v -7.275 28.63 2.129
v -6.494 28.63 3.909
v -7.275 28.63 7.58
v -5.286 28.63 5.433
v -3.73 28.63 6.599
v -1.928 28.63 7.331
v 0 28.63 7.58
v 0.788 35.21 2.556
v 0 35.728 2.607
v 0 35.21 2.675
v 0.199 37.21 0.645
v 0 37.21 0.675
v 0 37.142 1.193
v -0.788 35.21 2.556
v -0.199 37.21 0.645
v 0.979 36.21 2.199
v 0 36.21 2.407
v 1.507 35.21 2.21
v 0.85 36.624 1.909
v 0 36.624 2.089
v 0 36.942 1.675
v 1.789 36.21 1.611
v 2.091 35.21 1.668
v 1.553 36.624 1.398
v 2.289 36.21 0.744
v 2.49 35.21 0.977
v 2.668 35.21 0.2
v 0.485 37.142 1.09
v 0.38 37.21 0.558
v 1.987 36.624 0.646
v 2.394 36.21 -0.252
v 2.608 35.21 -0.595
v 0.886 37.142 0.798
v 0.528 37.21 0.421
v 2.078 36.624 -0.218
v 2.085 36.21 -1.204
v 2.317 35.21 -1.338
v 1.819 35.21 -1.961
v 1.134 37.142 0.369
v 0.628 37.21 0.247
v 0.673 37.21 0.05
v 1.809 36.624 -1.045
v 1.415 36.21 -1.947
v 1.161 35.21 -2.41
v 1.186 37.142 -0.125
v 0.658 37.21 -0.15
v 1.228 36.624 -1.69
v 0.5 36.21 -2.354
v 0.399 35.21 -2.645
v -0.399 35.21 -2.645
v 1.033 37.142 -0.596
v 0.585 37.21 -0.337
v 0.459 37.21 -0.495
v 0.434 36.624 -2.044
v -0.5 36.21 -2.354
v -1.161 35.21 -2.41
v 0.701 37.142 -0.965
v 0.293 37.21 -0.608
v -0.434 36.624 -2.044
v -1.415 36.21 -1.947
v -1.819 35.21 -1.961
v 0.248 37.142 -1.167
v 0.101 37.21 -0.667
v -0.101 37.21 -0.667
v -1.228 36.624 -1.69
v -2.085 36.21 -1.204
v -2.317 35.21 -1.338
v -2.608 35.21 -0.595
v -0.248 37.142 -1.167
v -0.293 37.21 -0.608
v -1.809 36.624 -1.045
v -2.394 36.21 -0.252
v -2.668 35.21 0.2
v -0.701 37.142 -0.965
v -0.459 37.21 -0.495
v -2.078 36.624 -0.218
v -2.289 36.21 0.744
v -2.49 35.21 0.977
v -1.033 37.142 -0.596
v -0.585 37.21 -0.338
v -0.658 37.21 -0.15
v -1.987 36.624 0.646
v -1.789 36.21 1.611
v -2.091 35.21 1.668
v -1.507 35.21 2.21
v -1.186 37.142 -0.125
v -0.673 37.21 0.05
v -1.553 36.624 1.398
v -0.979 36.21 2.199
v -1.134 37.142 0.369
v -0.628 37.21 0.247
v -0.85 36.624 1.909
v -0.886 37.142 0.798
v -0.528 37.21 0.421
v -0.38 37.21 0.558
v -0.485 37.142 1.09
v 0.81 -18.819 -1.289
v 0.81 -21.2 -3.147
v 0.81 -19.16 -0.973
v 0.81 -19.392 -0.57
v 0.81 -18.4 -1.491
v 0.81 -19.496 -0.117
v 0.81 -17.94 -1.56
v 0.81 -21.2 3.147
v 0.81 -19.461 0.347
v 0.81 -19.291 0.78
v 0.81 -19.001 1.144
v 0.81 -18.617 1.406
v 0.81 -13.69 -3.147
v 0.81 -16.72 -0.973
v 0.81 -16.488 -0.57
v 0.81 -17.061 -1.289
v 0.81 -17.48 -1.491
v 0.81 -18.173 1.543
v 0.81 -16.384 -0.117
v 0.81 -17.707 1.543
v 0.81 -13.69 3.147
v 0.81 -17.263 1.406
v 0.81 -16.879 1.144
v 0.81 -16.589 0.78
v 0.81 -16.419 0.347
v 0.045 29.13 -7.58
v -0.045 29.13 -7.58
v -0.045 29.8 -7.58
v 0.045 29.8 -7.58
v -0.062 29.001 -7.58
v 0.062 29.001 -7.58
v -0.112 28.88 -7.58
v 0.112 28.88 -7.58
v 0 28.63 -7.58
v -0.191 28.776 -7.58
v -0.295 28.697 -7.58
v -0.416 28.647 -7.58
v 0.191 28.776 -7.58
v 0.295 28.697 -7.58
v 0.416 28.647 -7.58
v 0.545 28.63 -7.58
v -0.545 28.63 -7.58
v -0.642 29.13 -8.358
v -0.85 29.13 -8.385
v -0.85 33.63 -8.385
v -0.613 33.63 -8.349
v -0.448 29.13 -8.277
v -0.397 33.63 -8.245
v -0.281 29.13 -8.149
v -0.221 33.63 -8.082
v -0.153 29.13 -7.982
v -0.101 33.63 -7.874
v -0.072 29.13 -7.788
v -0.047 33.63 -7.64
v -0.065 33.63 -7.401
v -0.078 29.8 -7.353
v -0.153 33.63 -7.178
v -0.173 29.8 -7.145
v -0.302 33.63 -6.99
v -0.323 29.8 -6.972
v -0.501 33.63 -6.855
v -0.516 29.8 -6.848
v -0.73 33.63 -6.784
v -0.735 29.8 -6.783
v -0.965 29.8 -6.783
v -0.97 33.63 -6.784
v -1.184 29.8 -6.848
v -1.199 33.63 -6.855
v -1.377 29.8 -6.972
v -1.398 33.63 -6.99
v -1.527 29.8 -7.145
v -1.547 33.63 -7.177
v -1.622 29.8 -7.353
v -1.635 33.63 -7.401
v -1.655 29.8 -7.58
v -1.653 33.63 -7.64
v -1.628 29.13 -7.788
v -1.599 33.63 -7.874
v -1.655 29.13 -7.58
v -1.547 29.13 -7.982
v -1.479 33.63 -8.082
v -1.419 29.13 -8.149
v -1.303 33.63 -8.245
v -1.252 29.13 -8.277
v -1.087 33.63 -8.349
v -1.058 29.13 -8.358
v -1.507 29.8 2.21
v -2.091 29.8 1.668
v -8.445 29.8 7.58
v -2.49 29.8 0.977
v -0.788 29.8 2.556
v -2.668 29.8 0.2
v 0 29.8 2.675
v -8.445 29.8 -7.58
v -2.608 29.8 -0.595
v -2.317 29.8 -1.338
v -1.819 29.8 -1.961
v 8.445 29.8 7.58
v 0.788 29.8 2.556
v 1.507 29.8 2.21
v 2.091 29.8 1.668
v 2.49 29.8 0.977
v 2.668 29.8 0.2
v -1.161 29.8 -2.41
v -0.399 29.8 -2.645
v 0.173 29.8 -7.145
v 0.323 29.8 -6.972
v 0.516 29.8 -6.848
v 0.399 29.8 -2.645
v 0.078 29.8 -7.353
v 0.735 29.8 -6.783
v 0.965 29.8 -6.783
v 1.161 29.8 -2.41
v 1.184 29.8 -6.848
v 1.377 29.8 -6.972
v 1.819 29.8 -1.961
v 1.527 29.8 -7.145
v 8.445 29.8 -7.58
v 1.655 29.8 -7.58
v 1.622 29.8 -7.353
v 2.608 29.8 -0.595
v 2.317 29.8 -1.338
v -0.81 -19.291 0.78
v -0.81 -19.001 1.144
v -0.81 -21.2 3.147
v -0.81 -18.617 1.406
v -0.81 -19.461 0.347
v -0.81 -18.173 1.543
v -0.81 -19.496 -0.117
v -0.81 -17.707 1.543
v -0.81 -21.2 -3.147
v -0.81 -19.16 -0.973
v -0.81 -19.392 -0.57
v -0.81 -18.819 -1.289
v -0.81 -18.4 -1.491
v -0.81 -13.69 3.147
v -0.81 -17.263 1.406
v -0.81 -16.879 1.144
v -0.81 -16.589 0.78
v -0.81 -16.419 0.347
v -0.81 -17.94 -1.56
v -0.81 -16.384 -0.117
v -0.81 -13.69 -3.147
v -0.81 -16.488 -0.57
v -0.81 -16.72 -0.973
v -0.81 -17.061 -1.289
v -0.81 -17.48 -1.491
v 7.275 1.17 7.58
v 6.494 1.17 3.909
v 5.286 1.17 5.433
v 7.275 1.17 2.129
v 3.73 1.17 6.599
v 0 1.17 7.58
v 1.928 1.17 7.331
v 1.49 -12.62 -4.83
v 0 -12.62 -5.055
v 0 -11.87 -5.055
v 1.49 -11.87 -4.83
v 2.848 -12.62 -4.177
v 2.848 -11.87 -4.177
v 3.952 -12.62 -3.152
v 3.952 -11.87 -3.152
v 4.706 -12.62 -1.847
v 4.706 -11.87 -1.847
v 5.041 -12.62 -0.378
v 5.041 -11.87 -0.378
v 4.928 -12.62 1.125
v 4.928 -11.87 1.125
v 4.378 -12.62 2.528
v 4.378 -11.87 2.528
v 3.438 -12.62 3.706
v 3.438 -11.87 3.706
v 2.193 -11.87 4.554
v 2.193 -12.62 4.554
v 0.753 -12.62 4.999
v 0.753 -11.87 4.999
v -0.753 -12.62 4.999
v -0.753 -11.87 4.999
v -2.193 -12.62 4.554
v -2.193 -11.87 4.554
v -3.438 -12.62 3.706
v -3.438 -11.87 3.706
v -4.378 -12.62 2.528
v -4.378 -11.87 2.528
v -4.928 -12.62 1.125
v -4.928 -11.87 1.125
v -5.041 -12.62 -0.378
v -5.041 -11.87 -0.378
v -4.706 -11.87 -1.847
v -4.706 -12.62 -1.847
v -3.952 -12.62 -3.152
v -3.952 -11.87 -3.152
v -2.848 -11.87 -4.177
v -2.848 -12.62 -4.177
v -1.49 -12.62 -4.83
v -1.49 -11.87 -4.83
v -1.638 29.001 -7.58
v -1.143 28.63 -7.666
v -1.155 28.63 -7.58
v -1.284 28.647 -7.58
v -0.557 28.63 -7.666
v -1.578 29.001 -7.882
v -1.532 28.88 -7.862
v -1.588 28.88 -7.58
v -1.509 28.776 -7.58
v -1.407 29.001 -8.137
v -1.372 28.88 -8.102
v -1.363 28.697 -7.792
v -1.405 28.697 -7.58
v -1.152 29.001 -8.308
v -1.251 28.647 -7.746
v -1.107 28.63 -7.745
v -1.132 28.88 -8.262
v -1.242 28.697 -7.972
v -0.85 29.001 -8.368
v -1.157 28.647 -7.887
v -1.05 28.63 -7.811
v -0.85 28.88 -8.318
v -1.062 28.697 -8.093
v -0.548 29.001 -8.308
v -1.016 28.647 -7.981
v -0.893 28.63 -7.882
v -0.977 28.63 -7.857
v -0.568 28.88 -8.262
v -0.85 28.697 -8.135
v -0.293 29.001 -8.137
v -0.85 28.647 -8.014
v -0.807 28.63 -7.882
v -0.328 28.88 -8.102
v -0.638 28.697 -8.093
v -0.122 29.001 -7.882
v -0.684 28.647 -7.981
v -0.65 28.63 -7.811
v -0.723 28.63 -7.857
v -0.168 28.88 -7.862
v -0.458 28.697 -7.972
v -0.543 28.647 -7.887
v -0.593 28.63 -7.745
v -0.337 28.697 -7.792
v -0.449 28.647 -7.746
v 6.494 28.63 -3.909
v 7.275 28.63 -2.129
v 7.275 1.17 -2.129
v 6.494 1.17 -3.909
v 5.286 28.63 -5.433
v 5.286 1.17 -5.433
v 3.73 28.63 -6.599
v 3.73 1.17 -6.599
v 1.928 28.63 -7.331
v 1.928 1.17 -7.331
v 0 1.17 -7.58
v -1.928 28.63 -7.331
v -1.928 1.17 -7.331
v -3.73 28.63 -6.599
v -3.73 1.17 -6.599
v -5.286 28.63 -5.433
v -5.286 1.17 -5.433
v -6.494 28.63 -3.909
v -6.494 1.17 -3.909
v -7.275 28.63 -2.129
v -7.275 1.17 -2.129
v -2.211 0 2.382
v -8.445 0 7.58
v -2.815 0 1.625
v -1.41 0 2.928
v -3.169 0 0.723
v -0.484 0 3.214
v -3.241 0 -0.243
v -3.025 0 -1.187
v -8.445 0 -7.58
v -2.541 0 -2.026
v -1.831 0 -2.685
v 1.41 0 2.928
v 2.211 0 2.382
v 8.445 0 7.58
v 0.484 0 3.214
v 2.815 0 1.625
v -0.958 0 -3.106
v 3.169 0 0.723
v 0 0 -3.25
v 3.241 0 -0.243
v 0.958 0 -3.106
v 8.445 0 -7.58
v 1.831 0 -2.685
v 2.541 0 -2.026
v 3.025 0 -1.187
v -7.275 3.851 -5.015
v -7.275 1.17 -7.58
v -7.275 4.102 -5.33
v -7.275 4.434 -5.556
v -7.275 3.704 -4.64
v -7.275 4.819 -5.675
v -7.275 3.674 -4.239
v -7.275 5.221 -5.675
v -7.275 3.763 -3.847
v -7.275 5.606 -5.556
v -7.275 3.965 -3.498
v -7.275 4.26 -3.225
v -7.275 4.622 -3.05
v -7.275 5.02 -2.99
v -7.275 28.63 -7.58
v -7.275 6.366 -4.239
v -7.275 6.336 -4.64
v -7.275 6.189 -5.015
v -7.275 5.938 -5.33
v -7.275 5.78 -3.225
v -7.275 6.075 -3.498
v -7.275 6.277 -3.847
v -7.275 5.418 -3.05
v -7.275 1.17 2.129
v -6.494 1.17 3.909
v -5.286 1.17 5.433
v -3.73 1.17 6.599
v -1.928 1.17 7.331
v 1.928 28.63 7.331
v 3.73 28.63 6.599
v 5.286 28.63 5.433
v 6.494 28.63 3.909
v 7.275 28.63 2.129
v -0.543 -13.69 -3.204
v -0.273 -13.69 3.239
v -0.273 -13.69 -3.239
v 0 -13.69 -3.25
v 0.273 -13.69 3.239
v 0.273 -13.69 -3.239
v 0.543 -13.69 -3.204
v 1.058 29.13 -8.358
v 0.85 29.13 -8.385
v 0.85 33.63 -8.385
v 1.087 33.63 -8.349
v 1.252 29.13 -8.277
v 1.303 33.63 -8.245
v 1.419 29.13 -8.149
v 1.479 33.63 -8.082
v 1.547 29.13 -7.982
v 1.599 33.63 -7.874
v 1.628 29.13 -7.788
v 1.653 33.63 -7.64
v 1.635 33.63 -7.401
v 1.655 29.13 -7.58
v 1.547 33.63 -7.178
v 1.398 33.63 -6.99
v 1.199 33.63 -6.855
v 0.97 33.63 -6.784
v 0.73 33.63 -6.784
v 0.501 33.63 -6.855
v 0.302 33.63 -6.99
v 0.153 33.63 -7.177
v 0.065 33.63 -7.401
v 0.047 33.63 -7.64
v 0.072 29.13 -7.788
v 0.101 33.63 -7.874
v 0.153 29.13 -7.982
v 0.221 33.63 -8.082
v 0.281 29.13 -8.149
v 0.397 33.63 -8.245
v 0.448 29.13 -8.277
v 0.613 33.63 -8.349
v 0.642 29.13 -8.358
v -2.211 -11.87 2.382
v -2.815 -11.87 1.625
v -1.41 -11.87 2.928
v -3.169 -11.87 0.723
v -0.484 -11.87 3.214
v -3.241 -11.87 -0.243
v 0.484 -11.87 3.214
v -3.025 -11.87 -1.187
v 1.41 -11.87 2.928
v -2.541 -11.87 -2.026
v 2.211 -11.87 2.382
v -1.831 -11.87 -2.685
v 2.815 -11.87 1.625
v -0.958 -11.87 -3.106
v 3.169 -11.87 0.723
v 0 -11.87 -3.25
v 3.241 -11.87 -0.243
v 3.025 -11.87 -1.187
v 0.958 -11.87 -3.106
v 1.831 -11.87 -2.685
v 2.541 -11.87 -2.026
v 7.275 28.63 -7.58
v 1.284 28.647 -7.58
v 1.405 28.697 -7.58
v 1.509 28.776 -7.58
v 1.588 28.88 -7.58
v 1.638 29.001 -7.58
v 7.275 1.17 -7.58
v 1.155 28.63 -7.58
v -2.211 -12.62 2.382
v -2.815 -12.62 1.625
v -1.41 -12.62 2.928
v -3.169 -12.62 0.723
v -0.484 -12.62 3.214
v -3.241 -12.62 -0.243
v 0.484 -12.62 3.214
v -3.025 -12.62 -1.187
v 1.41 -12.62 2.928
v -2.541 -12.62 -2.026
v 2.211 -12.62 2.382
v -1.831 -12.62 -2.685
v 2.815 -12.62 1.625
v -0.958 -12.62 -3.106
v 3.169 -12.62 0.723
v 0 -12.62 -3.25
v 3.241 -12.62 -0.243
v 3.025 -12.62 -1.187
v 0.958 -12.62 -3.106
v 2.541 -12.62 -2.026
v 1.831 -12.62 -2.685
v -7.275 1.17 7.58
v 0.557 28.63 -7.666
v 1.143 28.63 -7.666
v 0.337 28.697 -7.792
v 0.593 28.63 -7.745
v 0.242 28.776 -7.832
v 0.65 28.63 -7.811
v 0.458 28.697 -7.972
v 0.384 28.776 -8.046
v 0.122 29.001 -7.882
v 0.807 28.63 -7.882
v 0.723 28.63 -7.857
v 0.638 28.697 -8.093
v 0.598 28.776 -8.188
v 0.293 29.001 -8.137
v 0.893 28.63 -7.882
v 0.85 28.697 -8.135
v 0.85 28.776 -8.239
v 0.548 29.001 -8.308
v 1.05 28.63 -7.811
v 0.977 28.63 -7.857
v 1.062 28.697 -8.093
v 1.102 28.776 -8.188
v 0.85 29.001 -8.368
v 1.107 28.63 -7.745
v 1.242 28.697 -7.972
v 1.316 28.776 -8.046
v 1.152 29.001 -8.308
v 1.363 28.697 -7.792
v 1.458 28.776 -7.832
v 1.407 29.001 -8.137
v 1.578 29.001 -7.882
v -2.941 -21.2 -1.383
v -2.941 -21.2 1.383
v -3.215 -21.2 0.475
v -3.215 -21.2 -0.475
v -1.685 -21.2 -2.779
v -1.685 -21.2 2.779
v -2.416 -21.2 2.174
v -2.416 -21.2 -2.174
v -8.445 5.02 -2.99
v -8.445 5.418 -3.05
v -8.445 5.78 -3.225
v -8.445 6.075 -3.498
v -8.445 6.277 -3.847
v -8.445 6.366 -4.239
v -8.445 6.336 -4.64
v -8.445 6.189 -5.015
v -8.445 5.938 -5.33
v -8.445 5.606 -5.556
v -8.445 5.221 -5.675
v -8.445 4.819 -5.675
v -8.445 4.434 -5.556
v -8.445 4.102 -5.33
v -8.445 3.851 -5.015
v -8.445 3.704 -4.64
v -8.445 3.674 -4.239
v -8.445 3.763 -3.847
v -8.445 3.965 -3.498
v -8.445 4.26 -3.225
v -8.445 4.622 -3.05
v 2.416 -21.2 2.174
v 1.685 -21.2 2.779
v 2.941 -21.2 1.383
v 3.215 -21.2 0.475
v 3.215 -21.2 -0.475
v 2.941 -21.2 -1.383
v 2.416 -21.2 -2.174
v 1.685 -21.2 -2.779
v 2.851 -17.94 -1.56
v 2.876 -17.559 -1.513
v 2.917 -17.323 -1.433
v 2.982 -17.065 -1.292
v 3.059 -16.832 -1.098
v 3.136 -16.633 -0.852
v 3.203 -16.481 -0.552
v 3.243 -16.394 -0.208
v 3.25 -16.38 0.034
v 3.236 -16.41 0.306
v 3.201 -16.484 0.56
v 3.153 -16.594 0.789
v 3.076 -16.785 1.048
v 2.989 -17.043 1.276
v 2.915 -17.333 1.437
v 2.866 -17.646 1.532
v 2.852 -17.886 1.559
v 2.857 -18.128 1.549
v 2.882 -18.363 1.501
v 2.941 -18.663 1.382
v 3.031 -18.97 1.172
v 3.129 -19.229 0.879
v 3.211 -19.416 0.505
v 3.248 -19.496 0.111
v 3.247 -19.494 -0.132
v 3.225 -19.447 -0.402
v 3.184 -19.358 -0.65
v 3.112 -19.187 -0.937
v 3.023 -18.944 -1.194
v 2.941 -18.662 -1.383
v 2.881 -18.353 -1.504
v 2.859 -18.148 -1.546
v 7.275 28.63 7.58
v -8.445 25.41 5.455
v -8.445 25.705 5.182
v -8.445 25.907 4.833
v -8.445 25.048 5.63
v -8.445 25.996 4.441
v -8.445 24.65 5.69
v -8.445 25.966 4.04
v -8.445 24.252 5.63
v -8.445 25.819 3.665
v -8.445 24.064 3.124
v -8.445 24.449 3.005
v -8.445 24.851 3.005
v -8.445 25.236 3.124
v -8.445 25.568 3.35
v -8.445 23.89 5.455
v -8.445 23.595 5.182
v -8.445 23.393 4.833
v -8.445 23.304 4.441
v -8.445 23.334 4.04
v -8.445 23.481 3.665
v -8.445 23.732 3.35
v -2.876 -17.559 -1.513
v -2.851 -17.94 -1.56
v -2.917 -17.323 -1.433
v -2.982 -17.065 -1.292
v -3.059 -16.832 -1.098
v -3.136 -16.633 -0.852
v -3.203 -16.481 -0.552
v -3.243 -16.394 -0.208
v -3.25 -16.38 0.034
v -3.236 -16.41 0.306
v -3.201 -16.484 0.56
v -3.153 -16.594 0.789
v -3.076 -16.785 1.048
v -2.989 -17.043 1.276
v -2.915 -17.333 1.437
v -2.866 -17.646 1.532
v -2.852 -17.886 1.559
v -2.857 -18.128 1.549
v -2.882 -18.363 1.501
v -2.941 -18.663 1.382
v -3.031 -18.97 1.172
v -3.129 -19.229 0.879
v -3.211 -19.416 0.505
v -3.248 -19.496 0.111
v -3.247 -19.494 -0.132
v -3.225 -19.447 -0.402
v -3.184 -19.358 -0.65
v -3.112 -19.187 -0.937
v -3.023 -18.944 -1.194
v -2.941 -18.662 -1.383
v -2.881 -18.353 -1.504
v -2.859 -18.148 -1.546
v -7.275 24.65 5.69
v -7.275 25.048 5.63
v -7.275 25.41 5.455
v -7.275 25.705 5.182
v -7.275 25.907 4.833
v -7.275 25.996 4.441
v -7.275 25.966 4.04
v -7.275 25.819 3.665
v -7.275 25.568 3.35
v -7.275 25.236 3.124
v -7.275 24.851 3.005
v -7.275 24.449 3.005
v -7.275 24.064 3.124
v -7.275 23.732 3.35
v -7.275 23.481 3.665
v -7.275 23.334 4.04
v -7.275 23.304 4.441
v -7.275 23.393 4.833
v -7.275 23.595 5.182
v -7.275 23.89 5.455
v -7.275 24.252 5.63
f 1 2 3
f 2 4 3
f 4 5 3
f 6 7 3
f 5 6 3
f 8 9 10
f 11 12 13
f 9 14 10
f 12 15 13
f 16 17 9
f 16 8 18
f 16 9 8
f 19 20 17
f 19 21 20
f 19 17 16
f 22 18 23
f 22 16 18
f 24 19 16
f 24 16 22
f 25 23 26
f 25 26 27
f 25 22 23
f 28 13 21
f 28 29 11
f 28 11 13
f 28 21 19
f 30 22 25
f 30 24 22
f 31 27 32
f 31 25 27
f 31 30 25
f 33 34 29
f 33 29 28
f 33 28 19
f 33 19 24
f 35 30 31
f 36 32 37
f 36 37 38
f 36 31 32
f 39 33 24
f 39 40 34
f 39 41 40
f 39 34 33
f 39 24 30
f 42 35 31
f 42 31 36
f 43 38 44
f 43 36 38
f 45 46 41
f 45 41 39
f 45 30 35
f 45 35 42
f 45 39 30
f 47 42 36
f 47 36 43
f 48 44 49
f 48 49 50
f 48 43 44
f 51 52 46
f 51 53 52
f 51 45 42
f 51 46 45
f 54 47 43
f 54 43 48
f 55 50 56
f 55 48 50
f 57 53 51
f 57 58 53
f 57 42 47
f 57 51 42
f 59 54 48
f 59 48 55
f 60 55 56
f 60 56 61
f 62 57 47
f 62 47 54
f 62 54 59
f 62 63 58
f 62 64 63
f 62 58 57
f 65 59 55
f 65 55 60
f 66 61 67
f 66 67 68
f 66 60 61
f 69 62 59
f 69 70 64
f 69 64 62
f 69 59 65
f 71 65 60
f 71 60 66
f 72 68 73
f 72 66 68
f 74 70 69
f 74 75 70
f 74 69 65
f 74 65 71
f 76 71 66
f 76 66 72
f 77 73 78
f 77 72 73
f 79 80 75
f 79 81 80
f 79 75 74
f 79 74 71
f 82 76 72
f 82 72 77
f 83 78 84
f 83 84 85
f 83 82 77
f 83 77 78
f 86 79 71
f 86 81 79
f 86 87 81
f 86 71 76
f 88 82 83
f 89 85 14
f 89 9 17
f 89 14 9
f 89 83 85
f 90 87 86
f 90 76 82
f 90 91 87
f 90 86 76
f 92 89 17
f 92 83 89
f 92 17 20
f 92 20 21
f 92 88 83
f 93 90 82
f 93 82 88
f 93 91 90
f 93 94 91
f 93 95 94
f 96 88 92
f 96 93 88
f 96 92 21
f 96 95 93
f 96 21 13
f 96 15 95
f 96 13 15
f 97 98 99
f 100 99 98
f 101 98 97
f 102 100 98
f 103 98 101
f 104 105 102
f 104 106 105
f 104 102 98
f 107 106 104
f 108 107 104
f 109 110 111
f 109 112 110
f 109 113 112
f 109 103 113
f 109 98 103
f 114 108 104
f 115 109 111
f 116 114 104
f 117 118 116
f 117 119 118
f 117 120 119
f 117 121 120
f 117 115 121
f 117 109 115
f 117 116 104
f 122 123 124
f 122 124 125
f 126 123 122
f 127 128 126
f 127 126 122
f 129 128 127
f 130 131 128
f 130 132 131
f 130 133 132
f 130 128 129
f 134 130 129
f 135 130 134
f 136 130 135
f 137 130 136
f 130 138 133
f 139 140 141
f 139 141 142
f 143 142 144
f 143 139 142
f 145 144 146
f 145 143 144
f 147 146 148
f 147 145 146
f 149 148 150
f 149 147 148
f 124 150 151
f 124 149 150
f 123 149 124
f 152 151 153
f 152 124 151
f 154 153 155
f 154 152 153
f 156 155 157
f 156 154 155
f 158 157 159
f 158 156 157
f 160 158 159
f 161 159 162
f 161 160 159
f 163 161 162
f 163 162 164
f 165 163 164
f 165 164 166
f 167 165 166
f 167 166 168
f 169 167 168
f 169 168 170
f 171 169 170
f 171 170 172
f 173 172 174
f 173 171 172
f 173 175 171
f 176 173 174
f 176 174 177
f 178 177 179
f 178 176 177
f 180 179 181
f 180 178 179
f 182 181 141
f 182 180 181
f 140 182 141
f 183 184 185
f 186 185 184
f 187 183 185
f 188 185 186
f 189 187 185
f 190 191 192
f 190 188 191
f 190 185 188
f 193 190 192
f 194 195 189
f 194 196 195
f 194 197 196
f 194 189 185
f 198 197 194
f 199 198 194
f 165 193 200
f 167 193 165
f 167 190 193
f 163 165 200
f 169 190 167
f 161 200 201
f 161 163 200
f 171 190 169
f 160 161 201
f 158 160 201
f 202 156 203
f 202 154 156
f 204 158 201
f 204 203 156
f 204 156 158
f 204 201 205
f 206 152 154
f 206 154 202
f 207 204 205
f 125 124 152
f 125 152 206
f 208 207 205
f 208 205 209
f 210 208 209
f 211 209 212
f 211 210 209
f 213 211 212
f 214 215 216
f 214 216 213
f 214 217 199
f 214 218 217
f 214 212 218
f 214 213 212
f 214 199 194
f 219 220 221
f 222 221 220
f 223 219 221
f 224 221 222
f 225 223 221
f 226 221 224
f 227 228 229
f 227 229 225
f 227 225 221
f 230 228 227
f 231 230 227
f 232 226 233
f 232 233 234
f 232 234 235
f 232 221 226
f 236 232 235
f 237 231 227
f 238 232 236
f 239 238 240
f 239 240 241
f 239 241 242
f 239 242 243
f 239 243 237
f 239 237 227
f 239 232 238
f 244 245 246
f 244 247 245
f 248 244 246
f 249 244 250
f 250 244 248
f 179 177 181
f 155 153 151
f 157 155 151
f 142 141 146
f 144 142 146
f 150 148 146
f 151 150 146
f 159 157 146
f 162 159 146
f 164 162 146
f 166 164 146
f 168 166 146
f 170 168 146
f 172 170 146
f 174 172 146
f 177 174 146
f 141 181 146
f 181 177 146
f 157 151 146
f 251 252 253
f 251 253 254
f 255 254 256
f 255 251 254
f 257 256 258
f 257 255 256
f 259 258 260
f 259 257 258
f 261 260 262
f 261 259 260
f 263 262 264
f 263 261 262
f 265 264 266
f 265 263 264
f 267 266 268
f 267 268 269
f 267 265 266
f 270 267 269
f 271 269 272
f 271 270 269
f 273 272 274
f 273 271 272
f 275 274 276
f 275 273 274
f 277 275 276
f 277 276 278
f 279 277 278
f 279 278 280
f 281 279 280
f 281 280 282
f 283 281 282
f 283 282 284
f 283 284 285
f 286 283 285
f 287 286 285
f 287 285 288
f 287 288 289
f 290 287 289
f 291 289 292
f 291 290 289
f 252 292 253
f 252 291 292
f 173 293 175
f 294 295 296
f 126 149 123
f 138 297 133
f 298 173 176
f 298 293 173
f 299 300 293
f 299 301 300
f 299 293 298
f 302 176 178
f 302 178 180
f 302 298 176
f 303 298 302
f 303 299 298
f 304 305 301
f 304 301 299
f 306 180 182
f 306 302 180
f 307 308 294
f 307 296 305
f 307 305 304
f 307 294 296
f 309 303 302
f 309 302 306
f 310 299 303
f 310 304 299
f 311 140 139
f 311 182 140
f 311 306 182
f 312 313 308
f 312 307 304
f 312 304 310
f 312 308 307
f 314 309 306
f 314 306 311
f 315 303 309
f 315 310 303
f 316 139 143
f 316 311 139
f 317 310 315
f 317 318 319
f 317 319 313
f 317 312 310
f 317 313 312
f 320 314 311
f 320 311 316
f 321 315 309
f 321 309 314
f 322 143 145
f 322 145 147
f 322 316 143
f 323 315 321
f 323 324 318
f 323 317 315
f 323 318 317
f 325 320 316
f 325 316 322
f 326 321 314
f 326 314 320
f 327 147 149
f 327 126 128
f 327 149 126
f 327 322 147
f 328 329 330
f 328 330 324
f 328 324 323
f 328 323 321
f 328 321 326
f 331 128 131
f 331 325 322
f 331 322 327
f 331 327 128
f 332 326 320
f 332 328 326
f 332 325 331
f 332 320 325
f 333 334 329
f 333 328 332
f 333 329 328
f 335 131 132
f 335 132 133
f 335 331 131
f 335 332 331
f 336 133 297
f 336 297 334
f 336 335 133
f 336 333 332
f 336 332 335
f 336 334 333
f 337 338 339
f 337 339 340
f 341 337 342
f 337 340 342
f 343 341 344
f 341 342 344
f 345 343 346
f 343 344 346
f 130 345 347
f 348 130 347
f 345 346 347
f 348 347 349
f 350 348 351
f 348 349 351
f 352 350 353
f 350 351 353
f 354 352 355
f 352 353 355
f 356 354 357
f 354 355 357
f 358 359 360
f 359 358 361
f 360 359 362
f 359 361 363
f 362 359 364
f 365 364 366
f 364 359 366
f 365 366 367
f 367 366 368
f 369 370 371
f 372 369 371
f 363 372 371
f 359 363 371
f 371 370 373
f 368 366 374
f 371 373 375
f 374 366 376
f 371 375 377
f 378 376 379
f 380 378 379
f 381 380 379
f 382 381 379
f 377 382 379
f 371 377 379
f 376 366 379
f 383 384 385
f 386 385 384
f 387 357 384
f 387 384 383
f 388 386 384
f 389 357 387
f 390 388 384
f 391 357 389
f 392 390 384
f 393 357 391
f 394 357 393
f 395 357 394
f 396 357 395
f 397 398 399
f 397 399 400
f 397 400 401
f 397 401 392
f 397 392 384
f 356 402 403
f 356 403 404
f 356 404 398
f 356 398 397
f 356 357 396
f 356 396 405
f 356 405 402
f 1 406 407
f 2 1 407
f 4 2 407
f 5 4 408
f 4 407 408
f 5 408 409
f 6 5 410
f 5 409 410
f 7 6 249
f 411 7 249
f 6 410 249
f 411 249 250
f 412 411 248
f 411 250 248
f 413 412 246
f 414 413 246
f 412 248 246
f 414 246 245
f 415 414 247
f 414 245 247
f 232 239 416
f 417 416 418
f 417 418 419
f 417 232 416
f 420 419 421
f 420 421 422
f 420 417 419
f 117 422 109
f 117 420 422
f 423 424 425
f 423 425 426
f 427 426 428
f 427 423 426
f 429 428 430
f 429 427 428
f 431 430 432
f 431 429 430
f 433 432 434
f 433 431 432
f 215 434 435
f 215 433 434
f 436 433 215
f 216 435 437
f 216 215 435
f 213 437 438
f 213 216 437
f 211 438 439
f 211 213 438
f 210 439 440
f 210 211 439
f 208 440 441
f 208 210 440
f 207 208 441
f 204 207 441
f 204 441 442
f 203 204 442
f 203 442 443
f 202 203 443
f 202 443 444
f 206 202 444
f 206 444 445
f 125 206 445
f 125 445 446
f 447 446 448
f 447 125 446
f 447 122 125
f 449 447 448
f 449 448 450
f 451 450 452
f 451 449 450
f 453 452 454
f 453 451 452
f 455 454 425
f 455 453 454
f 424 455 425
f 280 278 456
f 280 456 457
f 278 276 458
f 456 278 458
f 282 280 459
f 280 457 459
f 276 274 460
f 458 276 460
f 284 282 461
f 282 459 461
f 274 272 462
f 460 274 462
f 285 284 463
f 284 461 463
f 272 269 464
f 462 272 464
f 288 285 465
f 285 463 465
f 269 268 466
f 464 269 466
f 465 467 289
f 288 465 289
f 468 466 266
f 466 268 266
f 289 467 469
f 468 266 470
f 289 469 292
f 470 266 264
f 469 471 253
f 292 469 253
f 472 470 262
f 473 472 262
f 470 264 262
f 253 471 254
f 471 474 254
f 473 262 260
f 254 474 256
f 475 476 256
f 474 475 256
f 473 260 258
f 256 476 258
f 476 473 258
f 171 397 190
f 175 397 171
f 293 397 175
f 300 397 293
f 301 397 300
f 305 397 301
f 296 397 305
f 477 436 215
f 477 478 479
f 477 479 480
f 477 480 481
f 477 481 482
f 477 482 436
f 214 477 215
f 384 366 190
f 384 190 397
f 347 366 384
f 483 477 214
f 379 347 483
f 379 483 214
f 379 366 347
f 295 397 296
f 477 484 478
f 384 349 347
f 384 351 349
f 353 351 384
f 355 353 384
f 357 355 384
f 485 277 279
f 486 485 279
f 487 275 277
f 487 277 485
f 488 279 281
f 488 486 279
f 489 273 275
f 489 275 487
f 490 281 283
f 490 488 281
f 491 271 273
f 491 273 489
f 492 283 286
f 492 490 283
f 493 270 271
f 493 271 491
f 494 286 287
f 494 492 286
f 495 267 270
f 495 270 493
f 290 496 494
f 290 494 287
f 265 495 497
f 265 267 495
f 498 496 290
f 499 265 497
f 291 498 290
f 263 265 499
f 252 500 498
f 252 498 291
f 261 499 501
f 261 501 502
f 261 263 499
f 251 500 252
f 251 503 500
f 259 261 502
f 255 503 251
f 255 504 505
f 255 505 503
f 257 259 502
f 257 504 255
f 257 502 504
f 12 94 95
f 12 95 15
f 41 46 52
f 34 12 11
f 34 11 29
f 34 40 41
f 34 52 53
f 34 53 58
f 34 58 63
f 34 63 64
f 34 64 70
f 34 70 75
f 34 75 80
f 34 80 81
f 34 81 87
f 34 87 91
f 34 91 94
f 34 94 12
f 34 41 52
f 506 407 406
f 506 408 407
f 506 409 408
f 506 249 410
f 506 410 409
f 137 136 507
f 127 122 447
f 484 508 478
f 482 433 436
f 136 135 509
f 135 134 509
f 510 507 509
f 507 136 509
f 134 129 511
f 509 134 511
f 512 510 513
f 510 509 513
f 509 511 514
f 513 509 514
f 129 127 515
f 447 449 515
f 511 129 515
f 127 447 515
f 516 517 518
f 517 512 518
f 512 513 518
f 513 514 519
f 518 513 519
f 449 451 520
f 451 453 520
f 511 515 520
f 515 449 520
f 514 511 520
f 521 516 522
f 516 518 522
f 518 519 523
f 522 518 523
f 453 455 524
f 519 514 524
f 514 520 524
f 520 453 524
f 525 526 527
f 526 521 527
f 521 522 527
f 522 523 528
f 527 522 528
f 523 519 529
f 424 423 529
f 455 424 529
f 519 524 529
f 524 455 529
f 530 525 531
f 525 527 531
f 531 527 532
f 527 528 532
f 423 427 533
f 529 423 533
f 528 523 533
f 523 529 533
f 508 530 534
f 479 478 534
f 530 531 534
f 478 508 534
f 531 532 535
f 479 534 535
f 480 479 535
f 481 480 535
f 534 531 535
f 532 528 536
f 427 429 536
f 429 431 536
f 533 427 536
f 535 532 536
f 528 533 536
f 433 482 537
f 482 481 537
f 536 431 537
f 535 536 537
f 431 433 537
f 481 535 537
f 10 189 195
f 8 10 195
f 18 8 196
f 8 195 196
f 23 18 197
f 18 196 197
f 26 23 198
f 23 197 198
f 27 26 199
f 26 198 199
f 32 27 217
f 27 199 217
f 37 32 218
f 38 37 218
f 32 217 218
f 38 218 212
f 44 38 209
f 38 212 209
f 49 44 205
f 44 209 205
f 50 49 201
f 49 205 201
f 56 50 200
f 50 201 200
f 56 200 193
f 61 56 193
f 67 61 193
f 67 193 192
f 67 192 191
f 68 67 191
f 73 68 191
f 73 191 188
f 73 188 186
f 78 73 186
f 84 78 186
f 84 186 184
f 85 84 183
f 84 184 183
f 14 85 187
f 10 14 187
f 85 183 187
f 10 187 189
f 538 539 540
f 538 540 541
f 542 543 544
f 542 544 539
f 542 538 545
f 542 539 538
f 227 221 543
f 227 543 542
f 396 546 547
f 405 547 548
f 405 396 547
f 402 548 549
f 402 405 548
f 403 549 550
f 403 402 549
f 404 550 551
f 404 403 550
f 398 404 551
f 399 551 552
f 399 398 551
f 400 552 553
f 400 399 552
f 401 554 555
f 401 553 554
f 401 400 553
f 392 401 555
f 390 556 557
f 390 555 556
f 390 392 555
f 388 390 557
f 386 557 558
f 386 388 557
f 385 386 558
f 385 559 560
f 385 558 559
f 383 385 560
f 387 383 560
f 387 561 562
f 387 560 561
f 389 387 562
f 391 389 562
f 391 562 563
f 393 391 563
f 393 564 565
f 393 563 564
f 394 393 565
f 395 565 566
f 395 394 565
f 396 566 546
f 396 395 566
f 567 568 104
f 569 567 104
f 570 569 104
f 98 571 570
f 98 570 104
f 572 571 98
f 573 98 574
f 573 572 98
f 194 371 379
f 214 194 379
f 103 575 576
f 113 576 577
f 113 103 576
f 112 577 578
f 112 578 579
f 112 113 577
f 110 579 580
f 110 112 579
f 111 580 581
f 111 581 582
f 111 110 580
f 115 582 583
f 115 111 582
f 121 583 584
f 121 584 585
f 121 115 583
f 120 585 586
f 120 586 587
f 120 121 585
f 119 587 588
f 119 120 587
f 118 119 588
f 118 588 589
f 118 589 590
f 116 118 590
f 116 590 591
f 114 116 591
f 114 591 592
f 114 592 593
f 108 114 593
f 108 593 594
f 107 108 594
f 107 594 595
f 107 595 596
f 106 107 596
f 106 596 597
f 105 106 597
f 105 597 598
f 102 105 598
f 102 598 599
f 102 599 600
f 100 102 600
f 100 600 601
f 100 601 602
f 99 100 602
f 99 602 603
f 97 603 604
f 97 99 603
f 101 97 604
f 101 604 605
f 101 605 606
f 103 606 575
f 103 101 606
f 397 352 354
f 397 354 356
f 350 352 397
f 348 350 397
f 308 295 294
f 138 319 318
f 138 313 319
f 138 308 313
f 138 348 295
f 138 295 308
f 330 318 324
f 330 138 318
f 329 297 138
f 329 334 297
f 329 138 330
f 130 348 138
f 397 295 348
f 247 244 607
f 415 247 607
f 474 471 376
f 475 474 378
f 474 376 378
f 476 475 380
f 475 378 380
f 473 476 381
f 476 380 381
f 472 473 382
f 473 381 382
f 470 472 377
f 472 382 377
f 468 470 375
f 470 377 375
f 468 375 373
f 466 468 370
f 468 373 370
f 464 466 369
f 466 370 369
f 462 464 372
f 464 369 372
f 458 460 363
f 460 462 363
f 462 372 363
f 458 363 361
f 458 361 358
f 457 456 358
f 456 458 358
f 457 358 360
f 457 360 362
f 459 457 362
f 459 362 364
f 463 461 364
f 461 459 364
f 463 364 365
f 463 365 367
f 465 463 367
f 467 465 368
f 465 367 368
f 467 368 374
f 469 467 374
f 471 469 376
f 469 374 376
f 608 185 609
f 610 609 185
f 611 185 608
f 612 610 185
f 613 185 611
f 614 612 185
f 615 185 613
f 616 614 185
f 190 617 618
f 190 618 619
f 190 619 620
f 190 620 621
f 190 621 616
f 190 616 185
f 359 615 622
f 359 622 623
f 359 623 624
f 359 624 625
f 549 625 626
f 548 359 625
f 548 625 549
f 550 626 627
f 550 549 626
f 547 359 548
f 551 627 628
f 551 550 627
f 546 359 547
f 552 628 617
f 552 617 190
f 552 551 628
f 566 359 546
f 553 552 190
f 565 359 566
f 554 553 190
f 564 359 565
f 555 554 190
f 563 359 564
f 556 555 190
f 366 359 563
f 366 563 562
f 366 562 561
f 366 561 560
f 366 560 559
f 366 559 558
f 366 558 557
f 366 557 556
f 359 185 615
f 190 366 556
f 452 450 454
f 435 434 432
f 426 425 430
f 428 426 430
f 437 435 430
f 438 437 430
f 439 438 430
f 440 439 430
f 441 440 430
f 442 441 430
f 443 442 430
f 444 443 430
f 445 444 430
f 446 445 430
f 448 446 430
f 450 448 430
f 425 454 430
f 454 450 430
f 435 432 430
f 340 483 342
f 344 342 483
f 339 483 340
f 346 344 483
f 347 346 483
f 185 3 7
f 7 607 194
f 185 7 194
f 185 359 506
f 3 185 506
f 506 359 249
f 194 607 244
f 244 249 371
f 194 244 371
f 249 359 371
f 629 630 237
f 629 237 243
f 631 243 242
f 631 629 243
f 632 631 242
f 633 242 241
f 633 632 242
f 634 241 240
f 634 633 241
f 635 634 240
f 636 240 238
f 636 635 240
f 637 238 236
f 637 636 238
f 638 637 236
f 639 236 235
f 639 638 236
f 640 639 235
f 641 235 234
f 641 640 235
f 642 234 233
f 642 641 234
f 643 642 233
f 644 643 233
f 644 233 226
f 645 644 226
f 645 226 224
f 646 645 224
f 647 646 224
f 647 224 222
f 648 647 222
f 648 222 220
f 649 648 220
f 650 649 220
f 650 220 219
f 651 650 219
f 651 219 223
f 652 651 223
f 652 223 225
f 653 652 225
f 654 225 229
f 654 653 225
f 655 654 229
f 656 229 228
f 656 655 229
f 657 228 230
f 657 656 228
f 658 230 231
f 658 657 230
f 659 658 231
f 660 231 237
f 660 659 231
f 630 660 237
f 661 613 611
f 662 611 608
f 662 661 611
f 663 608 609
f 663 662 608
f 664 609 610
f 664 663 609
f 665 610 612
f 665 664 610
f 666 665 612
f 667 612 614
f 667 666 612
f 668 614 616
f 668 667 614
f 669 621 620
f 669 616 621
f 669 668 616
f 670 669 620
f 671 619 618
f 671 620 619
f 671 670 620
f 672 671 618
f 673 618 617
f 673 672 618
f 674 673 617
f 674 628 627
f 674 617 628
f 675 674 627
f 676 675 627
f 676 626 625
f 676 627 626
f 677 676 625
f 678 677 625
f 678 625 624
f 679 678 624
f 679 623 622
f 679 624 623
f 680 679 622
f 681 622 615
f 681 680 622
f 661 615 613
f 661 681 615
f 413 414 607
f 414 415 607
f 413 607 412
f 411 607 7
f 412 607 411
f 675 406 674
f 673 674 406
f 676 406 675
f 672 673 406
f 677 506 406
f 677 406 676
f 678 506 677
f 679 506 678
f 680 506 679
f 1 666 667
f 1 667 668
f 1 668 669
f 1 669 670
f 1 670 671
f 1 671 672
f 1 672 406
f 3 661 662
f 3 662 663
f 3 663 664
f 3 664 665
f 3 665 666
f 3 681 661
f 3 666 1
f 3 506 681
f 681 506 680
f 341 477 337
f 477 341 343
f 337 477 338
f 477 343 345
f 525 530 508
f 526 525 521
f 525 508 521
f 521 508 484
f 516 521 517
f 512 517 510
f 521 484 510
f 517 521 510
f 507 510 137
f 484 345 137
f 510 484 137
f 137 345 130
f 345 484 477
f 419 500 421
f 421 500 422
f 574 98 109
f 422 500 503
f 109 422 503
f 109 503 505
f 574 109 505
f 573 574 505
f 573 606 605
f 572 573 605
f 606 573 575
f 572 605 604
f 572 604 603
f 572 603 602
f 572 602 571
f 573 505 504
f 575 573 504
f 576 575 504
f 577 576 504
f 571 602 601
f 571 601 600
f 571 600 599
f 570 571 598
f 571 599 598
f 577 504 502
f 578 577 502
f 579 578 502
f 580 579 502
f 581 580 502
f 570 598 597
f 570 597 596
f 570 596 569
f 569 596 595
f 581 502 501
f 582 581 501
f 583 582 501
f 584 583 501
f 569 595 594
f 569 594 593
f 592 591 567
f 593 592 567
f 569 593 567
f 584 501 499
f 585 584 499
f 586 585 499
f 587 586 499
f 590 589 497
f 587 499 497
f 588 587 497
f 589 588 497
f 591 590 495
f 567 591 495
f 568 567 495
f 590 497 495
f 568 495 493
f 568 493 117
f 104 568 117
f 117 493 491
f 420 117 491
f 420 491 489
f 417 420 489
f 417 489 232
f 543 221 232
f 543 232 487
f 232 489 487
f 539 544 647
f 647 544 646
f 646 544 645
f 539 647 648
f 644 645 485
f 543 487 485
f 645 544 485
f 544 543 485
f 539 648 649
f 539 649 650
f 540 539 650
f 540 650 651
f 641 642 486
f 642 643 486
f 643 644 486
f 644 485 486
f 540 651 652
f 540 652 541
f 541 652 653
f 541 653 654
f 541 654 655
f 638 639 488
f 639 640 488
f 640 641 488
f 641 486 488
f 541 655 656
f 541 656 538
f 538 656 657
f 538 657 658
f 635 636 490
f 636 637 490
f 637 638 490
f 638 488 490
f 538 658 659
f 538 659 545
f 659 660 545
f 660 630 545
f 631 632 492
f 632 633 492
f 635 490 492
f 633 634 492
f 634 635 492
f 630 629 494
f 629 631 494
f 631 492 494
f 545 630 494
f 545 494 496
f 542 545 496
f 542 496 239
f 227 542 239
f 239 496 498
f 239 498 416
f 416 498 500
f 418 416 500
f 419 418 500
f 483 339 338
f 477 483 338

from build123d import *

# Parameters (mm, degrees)
SKETCH1_W               = 16.89
SKETCH1_H               = 15.16
BOSS_EXTRUDE1_DEPTH     = 29.8
CUT_EXTRUDE1_DEPTH      = 35.484541827
CUT_EXTRUDE1_DEPTH_BACK = 35.484541827
SKETCH2_W               = 14.55
SKETCH2_H               = 27.46
SKETCH3_R               = 3.25
BOSS_EXTRUDE2_DEPTH     = 21.2
CUT_EXTRUDE2_DEPTH      = 53.247243229
CUT_EXTRUDE2_DEPTH_BACK = 7.51
CUT_EXTRUDE3_DEPTH      = 32.887527734
CUT_EXTRUDE3_DEPTH_BACK = 32.887527734
SKETCH5_R               = 1.56
SKETCH6_R               = 2.675
BOSS_EXTRUDE3_DEPTH     = 7.41
FILLET1_R               = 2
SKETCH7_R               = 7.58
BOSS_EXTRUDE4_DEPTH     = 27.46
SKETCH8_R               = 0.805
BOSS_EXTRUDE7_DEPTH     = 5
FILLET2_R               = 0.5
CUT_EXTRUDE4_DEPTH      = 42.715278137
CUT_EXTRUDE4_DEPTH_BACK = 1.17
SKETCH9_R               = 1.35
BOSS_EXTRUDE8_START     = -8.58
SKETCH10_R              = 5.055
BOSS_EXTRUDE8_DEPTH     = 0.75


with BuildPart() as part:
    # Sketch1 → Boss-Extrude1 (new body)
    with BuildSketch(Plane(origin=(0, 0, 0), x_dir=(1, 0, 0), z_dir=(0, 1, 0))):
        Rectangle(SKETCH1_W, SKETCH1_H)
    extrude(amount=BOSS_EXTRUDE1_DEPTH)

    # Sketch2 → Cut-Extrude1 (cut, two sides: drawn at the far end of the back side and taken through both)
    with BuildSketch(Plane(origin=(0, 0, -7.58), x_dir=(-1, 0, 0), z_dir=(0, 0, -1)).offset(-CUT_EXTRUDE1_DEPTH_BACK)):
        with Locations((0, 14.9)):
            Rectangle(SKETCH2_W, SKETCH2_H)
    extrude(amount=CUT_EXTRUDE1_DEPTH + CUT_EXTRUDE1_DEPTH_BACK, mode=Mode.SUBTRACT)

    # Sketch3 → Boss-Extrude2 (add)
    with BuildSketch(Plane.XZ):
        with Locations(Location((0, 0, 0), (0, 0, 270))):
            Circle(SKETCH3_R)
    extrude(amount=BOSS_EXTRUDE2_DEPTH)

    # Sketch4 → Cut-Extrude2 (cut, two sides: drawn at the far end of the back side and taken through both)
    with BuildSketch(Plane.XZ.offset(21.2).offset(-CUT_EXTRUDE2_DEPTH_BACK)):
        with BuildLine():
            Line((-0.810006774, 3.147441664), (-0.810006774, -3.147441664))
            ThreePointArc((-0.810006774, -3.147441664), (-6.995e-06, -3.25), (0.809993226, -3.14744515))
            Line((0.809993226, -3.14744515), (0.809993226, 3.14744515))
            ThreePointArc((0.809993226, 3.14744515), (-6.995e-06, 3.25), (-0.810006774, 3.147441664))
        make_face()
    extrude(amount=CUT_EXTRUDE2_DEPTH + CUT_EXTRUDE2_DEPTH_BACK, mode=Mode.SUBTRACT)

    # Sketch5 → Cut-Extrude3 (cut, two sides: drawn at the far end of the back side and taken through both)
    with BuildSketch(Plane(origin=(0, 0, 0), x_dir=(0, 0, -1), z_dir=(1, 0, 0)).offset(-CUT_EXTRUDE3_DEPTH_BACK)):
        with Locations((0, -17.94)):
            Circle(SKETCH5_R)
    extrude(amount=CUT_EXTRUDE3_DEPTH + CUT_EXTRUDE3_DEPTH_BACK, mode=Mode.SUBTRACT)

    # Sketch6 → Boss-Extrude3 (add)
    with BuildSketch(Plane(origin=(0, 29.8, 0), x_dir=(1, 0, 0), z_dir=(0, 1, 0))):
        with Locations(Location((0, 0, 0), (0, 0, 270))):
            Circle(SKETCH6_R)
    extrude(amount=BOSS_EXTRUDE3_DEPTH)

    # Fillet1
    fillet1_edges = [part.edges().sort_by_distance(p)[0] for p in [
        (0, 37.21, -2.675),
    ]]
    fillet(fillet1_edges, radius=FILLET1_R)

    # Sketch7 → Boss-Extrude4 (add)
    with BuildSketch(Plane(origin=(0, 1.17, 0), x_dir=(1, 0, 0), z_dir=(0, 1, 0))):
        Circle(SKETCH7_R)
    extrude(amount=BOSS_EXTRUDE4_DEPTH)

    # Sketch8 → Boss-Extrude7 (add)
    with BuildSketch(Plane.XZ.offset(-28.63)):
        with Locations(Location((-0.85, -7.58, 0), (0, 0, 270))):
            Circle(SKETCH8_R)
        with Locations(Location((0.85, -7.58, 0), (0, 0, 270))):
            Circle(SKETCH8_R)
    extrude(amount=-BOSS_EXTRUDE7_DEPTH)

    # Fillet2
    fillet2_edges = [part.edges().sort_by_distance(p)[0] for p in [
        (-0.280779041, 28.63, -8.149220959),
        (-1.419220959, 28.63, -8.149220959),
        (0.280779041, 28.63, -8.149220959),
        (1.419220959, 28.63, -8.149220959),
    ]]
    fillet(fillet2_edges, radius=FILLET2_R)

    # Sketch9 → Cut-Extrude4 (cut, two sides: drawn at the far end of the back side and taken through both)
    with BuildSketch(Plane.ZY.offset(8.445).offset(-CUT_EXTRUDE4_DEPTH_BACK)):
        with Locations((4.34, 24.65)):
            Circle(SKETCH9_R)
        with Locations((-4.34, 5.02)):
            Circle(SKETCH9_R)
    extrude(amount=CUT_EXTRUDE4_DEPTH + CUT_EXTRUDE4_DEPTH_BACK, mode=Mode.SUBTRACT)

    # Sketch10 → Boss-Extrude8 (add)
    with BuildSketch(Plane.XZ.offset(21.2).offset(BOSS_EXTRUDE8_START)):
        with Locations(Location((0, 0, 0), (0, 0, 270))):
            Circle(SKETCH10_R)
    extrude(amount=-BOSS_EXTRUDE8_DEPTH)


solid = part.part
